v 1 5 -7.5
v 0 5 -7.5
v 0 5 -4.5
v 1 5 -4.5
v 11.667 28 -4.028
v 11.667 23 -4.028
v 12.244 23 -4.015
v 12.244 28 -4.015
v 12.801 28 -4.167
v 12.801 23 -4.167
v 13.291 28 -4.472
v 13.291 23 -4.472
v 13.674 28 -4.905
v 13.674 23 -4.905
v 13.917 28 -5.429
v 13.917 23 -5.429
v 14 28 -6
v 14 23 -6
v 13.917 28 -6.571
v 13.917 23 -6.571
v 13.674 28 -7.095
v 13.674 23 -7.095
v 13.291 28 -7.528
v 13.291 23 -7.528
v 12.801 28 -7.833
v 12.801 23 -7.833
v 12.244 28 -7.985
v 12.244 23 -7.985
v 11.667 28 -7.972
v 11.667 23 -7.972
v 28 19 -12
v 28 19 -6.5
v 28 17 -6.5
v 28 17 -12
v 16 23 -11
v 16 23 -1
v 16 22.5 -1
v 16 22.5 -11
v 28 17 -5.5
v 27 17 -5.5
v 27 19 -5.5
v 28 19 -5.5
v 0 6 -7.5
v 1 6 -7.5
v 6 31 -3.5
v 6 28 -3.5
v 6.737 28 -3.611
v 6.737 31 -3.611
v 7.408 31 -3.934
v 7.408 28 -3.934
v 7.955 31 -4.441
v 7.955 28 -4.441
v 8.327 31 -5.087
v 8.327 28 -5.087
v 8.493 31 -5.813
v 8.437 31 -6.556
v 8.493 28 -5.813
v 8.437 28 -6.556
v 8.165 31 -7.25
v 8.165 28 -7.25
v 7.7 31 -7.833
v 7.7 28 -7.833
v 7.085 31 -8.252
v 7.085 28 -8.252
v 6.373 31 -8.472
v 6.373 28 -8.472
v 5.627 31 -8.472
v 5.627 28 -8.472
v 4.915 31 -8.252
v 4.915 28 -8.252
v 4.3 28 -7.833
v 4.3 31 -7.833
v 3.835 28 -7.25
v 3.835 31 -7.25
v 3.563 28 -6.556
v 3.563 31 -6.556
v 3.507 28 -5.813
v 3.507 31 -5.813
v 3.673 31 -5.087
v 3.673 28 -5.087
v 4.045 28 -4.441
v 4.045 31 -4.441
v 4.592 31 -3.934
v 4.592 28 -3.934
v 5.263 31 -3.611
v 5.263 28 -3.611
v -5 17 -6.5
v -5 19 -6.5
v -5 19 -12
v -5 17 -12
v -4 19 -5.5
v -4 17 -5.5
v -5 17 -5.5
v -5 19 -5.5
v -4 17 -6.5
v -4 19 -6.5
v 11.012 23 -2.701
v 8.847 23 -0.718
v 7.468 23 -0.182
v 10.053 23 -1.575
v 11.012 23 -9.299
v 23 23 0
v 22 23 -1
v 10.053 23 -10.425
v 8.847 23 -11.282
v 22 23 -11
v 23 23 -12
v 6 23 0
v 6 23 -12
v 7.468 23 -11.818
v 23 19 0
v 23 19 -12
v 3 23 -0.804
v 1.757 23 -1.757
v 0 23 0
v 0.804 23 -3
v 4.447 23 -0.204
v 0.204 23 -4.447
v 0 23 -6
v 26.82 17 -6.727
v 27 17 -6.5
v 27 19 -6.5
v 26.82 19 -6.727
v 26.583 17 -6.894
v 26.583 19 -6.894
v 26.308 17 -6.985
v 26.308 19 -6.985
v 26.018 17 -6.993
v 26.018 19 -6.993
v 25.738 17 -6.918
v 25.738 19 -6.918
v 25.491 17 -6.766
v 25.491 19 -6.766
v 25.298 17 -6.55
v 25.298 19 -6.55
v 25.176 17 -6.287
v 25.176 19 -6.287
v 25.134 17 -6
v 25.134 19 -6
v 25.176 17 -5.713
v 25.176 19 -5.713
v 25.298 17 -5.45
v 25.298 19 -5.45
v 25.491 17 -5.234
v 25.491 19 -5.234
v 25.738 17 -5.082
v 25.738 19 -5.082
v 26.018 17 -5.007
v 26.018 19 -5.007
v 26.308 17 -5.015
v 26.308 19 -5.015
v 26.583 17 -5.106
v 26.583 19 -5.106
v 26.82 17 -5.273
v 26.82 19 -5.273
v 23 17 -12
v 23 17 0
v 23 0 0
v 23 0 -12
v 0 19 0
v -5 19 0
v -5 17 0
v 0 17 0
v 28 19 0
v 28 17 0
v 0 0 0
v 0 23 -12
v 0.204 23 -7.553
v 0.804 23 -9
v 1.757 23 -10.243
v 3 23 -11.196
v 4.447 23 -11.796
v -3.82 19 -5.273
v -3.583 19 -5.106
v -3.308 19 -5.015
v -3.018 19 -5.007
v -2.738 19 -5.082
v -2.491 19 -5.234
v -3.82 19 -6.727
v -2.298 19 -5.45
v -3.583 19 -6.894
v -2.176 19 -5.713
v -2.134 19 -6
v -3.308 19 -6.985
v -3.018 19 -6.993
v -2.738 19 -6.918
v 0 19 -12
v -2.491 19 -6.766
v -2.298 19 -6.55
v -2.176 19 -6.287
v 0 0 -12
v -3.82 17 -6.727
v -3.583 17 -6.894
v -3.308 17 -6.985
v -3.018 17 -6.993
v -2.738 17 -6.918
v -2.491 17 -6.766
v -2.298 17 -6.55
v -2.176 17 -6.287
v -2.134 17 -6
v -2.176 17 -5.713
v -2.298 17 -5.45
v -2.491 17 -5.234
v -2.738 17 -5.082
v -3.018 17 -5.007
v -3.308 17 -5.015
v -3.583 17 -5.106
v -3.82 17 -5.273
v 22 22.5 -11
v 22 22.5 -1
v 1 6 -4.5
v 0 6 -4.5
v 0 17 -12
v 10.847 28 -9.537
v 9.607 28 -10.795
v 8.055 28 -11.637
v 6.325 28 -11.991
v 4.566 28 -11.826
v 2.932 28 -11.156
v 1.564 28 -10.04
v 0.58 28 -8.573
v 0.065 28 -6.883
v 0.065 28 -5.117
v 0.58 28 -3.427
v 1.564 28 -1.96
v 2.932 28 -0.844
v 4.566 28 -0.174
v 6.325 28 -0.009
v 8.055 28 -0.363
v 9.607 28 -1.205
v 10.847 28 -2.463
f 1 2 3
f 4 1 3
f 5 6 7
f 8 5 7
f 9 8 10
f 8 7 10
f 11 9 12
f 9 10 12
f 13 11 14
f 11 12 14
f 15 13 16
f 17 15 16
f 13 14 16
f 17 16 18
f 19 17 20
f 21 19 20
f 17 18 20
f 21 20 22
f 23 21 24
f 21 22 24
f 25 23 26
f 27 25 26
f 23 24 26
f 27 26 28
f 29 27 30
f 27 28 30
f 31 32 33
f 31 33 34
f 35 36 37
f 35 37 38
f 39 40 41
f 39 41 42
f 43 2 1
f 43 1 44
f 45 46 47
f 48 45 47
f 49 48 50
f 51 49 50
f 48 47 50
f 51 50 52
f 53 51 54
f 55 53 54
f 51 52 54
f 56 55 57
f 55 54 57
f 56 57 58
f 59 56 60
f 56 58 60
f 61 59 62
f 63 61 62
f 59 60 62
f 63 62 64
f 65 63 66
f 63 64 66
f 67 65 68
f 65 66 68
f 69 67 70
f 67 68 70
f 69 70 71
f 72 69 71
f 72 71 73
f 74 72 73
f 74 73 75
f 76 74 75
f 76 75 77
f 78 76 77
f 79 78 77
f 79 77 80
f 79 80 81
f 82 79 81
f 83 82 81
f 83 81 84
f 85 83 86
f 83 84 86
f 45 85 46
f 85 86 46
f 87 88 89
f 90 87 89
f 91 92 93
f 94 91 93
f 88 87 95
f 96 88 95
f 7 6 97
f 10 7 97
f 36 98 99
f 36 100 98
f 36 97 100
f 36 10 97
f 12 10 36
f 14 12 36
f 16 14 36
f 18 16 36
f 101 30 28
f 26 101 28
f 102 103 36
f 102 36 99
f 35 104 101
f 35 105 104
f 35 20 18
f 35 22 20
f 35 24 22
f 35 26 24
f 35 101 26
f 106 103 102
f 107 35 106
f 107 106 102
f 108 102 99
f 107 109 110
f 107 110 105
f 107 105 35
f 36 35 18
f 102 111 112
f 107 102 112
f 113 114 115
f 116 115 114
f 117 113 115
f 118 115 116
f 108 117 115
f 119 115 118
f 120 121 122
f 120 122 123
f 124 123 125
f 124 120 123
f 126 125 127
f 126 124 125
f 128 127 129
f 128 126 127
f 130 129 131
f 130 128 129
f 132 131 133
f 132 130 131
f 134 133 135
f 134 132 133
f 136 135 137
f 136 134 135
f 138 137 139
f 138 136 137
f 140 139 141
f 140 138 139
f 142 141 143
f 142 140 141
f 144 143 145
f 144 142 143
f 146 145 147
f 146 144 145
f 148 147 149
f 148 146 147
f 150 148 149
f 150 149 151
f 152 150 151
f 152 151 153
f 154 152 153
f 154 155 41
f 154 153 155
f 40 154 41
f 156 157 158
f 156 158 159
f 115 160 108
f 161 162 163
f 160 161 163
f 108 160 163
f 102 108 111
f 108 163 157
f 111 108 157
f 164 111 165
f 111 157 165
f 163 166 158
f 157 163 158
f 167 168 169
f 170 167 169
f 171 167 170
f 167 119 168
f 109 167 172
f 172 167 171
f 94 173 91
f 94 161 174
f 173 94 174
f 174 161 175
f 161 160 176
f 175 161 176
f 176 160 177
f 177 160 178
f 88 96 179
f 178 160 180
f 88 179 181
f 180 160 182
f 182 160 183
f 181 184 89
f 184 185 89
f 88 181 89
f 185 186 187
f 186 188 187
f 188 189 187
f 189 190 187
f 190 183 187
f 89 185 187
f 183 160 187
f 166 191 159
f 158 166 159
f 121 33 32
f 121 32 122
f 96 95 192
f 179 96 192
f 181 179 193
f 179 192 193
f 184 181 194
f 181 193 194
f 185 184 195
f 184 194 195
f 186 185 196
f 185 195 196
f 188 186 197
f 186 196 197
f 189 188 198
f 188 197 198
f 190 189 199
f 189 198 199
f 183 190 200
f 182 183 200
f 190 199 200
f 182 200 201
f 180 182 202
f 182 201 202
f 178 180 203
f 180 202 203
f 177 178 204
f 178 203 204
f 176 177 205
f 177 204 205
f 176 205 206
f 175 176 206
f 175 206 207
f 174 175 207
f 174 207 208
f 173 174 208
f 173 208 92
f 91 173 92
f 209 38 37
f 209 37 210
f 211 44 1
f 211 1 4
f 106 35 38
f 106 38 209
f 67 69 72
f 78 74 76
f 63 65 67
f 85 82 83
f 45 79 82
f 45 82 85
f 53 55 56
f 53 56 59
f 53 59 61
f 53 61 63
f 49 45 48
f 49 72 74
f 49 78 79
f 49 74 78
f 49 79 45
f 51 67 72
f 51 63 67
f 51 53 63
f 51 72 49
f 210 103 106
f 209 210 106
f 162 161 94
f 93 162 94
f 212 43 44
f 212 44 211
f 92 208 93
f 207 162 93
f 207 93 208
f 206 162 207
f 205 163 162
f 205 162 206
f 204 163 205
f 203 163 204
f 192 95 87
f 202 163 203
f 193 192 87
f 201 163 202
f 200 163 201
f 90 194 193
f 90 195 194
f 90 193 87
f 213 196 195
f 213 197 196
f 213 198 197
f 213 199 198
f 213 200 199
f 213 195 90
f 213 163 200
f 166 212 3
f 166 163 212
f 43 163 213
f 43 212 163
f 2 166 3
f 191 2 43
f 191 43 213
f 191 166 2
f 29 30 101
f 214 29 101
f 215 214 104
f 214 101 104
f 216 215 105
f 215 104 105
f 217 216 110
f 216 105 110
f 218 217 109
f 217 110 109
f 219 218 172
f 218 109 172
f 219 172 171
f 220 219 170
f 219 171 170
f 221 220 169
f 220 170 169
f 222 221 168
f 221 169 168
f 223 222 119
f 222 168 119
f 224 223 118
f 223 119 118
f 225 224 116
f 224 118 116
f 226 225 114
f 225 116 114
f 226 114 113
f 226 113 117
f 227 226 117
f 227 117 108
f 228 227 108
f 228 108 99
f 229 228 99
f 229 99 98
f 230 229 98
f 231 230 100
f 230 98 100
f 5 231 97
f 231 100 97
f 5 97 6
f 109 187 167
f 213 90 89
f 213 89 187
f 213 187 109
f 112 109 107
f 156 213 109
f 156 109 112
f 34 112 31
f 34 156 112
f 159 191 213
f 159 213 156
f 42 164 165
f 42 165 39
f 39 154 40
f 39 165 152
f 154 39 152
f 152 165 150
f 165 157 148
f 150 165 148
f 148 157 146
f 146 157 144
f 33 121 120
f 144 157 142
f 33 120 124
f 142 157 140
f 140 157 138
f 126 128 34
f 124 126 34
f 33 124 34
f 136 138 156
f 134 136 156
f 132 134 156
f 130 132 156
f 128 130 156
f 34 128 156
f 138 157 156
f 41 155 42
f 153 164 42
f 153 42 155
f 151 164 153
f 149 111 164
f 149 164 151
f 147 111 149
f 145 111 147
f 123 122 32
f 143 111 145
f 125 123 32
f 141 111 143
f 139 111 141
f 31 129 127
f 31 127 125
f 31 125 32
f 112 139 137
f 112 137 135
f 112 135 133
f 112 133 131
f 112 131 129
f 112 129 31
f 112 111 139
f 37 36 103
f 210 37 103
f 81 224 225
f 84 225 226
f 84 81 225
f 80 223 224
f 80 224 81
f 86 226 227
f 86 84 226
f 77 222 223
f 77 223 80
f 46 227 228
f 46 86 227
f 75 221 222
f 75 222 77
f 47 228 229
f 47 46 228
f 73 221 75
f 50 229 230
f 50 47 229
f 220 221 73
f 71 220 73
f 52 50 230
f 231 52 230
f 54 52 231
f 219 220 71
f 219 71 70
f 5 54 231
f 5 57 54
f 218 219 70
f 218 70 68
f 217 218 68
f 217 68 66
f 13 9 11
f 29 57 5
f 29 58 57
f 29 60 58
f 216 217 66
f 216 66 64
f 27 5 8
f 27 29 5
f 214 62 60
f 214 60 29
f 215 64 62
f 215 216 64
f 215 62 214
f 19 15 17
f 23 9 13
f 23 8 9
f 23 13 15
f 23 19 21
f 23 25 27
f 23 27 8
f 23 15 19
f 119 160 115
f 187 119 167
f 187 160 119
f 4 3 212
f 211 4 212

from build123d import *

# Parameters (mm, degrees)
SKETCH1_W           = 23
SKETCH1_H           = 12
BOSS_EXTRUDE1_DEPTH = 23
BOSS_EXTRUDE2_DEPTH = 5
SKETCH3_W           = 12
SKETCH3_H           = 2
BOSS_EXTRUDE3_DEPTH = 5
CUT_EXTRUDE1_START  = -5
CUT_EXTRUDE1_DEPTH  = 41.902646142
SKETCH5_R           = 2.5
BOSS_EXTRUDE4_DEPTH = 3
SKETCH6_W           = 6
SKETCH6_H           = 10
CUT_EXTRUDE2_DEPTH  = 0.5
SKETCH7_W           = 3
SKETCH7_H           = 1
CUT_EXTRUDE3_DEPTH  = 1


with BuildPart() as part:
    # Sketch1 → Boss-Extrude1 (new body)
    with BuildSketch(Plane(origin=(0, 0, 0), x_dir=(1, 0, 0), z_dir=(0, 1, 0))):
        with Locations((11.5, 6)):
            Rectangle(SKETCH1_W, SKETCH1_H)
    extrude(amount=BOSS_EXTRUDE1_DEPTH)

    # Sketch2 → Boss-Extrude2 (add)
    with BuildSketch(Plane(origin=(0, 23, 0), x_dir=(1, 0, 0), z_dir=(0, 1, 0))):
        with BuildLine():
            ThreePointArc((11.666666667, 7.972026594), (0, 6), (11.666666667, 4.027973406))
            ThreePointArc((11.666666667, 4.027973406), (14, 6), (11.666666667, 7.972026594))
        make_face()
    extrude(amount=BOSS_EXTRUDE2_DEPTH)

    # Sketch3 → Boss-Extrude3 (add)
    with BuildSketch(Plane(origin=(23, 0, 0), x_dir=(0, 0, -1), z_dir=(1, 0, 0))):
        with Locations((6, 18)):
            Rectangle(SKETCH3_W, SKETCH3_H)
    boss_extrude3 = extrude(amount=BOSS_EXTRUDE3_DEPTH)

    # Sketch4 → Cut-Extrude1 (cut)
    with BuildSketch(Plane(origin=(0, 19, 0), x_dir=(1, 0, 0), z_dir=(0, 1, 0)).offset(CUT_EXTRUDE1_START)):
        with BuildLine():
            Line((28, 6.5), (27, 6.5))
            ThreePointArc((27, 6.5), (25.133974596, 6), (27, 5.5))
            Line((27, 5.5), (28, 5.5))
            Line((28, 5.5), (28, 6.5))
        make_face()
    cut_extrude1 = extrude(amount=CUT_EXTRUDE1_DEPTH, mode=Mode.SUBTRACT)

    # Mirror3: Boss-Extrude3, Cut-Extrude1 across plane
    add(boss_extrude3.mirror(Plane.ZY.offset(-11.5)))
    add(cut_extrude1.mirror(Plane.ZY.offset(-11.5)), mode=Mode.SUBTRACT)

    # Sketch5 → Boss-Extrude4 (add)
    with BuildSketch(Plane(origin=(0, 28, 0), x_dir=(1, 0, 0), z_dir=(0, 1, 0))):
        with Locations(Location((6, 6, 0), (0, 0, 270))):
            Circle(SKETCH5_R)
    extrude(amount=BOSS_EXTRUDE4_DEPTH)

    # Sketch6 → Cut-Extrude2 (cut)
    with BuildSketch(Plane(origin=(0, 23, 0), x_dir=(1, 0, 0), z_dir=(0, 1, 0))):
        with Locations((19, 6)):
            Rectangle(SKETCH6_W, SKETCH6_H)
    extrude(amount=-CUT_EXTRUDE2_DEPTH, mode=Mode.SUBTRACT)

    # Sketch7 → Cut-Extrude3 (cut)
    with BuildSketch(Plane.ZY):
        with Locations((-6, 5.5)):
            Rectangle(SKETCH7_W, SKETCH7_H)
    extrude(amount=-CUT_EXTRUDE3_DEPTH, mode=Mode.SUBTRACT)


solid = part.part
